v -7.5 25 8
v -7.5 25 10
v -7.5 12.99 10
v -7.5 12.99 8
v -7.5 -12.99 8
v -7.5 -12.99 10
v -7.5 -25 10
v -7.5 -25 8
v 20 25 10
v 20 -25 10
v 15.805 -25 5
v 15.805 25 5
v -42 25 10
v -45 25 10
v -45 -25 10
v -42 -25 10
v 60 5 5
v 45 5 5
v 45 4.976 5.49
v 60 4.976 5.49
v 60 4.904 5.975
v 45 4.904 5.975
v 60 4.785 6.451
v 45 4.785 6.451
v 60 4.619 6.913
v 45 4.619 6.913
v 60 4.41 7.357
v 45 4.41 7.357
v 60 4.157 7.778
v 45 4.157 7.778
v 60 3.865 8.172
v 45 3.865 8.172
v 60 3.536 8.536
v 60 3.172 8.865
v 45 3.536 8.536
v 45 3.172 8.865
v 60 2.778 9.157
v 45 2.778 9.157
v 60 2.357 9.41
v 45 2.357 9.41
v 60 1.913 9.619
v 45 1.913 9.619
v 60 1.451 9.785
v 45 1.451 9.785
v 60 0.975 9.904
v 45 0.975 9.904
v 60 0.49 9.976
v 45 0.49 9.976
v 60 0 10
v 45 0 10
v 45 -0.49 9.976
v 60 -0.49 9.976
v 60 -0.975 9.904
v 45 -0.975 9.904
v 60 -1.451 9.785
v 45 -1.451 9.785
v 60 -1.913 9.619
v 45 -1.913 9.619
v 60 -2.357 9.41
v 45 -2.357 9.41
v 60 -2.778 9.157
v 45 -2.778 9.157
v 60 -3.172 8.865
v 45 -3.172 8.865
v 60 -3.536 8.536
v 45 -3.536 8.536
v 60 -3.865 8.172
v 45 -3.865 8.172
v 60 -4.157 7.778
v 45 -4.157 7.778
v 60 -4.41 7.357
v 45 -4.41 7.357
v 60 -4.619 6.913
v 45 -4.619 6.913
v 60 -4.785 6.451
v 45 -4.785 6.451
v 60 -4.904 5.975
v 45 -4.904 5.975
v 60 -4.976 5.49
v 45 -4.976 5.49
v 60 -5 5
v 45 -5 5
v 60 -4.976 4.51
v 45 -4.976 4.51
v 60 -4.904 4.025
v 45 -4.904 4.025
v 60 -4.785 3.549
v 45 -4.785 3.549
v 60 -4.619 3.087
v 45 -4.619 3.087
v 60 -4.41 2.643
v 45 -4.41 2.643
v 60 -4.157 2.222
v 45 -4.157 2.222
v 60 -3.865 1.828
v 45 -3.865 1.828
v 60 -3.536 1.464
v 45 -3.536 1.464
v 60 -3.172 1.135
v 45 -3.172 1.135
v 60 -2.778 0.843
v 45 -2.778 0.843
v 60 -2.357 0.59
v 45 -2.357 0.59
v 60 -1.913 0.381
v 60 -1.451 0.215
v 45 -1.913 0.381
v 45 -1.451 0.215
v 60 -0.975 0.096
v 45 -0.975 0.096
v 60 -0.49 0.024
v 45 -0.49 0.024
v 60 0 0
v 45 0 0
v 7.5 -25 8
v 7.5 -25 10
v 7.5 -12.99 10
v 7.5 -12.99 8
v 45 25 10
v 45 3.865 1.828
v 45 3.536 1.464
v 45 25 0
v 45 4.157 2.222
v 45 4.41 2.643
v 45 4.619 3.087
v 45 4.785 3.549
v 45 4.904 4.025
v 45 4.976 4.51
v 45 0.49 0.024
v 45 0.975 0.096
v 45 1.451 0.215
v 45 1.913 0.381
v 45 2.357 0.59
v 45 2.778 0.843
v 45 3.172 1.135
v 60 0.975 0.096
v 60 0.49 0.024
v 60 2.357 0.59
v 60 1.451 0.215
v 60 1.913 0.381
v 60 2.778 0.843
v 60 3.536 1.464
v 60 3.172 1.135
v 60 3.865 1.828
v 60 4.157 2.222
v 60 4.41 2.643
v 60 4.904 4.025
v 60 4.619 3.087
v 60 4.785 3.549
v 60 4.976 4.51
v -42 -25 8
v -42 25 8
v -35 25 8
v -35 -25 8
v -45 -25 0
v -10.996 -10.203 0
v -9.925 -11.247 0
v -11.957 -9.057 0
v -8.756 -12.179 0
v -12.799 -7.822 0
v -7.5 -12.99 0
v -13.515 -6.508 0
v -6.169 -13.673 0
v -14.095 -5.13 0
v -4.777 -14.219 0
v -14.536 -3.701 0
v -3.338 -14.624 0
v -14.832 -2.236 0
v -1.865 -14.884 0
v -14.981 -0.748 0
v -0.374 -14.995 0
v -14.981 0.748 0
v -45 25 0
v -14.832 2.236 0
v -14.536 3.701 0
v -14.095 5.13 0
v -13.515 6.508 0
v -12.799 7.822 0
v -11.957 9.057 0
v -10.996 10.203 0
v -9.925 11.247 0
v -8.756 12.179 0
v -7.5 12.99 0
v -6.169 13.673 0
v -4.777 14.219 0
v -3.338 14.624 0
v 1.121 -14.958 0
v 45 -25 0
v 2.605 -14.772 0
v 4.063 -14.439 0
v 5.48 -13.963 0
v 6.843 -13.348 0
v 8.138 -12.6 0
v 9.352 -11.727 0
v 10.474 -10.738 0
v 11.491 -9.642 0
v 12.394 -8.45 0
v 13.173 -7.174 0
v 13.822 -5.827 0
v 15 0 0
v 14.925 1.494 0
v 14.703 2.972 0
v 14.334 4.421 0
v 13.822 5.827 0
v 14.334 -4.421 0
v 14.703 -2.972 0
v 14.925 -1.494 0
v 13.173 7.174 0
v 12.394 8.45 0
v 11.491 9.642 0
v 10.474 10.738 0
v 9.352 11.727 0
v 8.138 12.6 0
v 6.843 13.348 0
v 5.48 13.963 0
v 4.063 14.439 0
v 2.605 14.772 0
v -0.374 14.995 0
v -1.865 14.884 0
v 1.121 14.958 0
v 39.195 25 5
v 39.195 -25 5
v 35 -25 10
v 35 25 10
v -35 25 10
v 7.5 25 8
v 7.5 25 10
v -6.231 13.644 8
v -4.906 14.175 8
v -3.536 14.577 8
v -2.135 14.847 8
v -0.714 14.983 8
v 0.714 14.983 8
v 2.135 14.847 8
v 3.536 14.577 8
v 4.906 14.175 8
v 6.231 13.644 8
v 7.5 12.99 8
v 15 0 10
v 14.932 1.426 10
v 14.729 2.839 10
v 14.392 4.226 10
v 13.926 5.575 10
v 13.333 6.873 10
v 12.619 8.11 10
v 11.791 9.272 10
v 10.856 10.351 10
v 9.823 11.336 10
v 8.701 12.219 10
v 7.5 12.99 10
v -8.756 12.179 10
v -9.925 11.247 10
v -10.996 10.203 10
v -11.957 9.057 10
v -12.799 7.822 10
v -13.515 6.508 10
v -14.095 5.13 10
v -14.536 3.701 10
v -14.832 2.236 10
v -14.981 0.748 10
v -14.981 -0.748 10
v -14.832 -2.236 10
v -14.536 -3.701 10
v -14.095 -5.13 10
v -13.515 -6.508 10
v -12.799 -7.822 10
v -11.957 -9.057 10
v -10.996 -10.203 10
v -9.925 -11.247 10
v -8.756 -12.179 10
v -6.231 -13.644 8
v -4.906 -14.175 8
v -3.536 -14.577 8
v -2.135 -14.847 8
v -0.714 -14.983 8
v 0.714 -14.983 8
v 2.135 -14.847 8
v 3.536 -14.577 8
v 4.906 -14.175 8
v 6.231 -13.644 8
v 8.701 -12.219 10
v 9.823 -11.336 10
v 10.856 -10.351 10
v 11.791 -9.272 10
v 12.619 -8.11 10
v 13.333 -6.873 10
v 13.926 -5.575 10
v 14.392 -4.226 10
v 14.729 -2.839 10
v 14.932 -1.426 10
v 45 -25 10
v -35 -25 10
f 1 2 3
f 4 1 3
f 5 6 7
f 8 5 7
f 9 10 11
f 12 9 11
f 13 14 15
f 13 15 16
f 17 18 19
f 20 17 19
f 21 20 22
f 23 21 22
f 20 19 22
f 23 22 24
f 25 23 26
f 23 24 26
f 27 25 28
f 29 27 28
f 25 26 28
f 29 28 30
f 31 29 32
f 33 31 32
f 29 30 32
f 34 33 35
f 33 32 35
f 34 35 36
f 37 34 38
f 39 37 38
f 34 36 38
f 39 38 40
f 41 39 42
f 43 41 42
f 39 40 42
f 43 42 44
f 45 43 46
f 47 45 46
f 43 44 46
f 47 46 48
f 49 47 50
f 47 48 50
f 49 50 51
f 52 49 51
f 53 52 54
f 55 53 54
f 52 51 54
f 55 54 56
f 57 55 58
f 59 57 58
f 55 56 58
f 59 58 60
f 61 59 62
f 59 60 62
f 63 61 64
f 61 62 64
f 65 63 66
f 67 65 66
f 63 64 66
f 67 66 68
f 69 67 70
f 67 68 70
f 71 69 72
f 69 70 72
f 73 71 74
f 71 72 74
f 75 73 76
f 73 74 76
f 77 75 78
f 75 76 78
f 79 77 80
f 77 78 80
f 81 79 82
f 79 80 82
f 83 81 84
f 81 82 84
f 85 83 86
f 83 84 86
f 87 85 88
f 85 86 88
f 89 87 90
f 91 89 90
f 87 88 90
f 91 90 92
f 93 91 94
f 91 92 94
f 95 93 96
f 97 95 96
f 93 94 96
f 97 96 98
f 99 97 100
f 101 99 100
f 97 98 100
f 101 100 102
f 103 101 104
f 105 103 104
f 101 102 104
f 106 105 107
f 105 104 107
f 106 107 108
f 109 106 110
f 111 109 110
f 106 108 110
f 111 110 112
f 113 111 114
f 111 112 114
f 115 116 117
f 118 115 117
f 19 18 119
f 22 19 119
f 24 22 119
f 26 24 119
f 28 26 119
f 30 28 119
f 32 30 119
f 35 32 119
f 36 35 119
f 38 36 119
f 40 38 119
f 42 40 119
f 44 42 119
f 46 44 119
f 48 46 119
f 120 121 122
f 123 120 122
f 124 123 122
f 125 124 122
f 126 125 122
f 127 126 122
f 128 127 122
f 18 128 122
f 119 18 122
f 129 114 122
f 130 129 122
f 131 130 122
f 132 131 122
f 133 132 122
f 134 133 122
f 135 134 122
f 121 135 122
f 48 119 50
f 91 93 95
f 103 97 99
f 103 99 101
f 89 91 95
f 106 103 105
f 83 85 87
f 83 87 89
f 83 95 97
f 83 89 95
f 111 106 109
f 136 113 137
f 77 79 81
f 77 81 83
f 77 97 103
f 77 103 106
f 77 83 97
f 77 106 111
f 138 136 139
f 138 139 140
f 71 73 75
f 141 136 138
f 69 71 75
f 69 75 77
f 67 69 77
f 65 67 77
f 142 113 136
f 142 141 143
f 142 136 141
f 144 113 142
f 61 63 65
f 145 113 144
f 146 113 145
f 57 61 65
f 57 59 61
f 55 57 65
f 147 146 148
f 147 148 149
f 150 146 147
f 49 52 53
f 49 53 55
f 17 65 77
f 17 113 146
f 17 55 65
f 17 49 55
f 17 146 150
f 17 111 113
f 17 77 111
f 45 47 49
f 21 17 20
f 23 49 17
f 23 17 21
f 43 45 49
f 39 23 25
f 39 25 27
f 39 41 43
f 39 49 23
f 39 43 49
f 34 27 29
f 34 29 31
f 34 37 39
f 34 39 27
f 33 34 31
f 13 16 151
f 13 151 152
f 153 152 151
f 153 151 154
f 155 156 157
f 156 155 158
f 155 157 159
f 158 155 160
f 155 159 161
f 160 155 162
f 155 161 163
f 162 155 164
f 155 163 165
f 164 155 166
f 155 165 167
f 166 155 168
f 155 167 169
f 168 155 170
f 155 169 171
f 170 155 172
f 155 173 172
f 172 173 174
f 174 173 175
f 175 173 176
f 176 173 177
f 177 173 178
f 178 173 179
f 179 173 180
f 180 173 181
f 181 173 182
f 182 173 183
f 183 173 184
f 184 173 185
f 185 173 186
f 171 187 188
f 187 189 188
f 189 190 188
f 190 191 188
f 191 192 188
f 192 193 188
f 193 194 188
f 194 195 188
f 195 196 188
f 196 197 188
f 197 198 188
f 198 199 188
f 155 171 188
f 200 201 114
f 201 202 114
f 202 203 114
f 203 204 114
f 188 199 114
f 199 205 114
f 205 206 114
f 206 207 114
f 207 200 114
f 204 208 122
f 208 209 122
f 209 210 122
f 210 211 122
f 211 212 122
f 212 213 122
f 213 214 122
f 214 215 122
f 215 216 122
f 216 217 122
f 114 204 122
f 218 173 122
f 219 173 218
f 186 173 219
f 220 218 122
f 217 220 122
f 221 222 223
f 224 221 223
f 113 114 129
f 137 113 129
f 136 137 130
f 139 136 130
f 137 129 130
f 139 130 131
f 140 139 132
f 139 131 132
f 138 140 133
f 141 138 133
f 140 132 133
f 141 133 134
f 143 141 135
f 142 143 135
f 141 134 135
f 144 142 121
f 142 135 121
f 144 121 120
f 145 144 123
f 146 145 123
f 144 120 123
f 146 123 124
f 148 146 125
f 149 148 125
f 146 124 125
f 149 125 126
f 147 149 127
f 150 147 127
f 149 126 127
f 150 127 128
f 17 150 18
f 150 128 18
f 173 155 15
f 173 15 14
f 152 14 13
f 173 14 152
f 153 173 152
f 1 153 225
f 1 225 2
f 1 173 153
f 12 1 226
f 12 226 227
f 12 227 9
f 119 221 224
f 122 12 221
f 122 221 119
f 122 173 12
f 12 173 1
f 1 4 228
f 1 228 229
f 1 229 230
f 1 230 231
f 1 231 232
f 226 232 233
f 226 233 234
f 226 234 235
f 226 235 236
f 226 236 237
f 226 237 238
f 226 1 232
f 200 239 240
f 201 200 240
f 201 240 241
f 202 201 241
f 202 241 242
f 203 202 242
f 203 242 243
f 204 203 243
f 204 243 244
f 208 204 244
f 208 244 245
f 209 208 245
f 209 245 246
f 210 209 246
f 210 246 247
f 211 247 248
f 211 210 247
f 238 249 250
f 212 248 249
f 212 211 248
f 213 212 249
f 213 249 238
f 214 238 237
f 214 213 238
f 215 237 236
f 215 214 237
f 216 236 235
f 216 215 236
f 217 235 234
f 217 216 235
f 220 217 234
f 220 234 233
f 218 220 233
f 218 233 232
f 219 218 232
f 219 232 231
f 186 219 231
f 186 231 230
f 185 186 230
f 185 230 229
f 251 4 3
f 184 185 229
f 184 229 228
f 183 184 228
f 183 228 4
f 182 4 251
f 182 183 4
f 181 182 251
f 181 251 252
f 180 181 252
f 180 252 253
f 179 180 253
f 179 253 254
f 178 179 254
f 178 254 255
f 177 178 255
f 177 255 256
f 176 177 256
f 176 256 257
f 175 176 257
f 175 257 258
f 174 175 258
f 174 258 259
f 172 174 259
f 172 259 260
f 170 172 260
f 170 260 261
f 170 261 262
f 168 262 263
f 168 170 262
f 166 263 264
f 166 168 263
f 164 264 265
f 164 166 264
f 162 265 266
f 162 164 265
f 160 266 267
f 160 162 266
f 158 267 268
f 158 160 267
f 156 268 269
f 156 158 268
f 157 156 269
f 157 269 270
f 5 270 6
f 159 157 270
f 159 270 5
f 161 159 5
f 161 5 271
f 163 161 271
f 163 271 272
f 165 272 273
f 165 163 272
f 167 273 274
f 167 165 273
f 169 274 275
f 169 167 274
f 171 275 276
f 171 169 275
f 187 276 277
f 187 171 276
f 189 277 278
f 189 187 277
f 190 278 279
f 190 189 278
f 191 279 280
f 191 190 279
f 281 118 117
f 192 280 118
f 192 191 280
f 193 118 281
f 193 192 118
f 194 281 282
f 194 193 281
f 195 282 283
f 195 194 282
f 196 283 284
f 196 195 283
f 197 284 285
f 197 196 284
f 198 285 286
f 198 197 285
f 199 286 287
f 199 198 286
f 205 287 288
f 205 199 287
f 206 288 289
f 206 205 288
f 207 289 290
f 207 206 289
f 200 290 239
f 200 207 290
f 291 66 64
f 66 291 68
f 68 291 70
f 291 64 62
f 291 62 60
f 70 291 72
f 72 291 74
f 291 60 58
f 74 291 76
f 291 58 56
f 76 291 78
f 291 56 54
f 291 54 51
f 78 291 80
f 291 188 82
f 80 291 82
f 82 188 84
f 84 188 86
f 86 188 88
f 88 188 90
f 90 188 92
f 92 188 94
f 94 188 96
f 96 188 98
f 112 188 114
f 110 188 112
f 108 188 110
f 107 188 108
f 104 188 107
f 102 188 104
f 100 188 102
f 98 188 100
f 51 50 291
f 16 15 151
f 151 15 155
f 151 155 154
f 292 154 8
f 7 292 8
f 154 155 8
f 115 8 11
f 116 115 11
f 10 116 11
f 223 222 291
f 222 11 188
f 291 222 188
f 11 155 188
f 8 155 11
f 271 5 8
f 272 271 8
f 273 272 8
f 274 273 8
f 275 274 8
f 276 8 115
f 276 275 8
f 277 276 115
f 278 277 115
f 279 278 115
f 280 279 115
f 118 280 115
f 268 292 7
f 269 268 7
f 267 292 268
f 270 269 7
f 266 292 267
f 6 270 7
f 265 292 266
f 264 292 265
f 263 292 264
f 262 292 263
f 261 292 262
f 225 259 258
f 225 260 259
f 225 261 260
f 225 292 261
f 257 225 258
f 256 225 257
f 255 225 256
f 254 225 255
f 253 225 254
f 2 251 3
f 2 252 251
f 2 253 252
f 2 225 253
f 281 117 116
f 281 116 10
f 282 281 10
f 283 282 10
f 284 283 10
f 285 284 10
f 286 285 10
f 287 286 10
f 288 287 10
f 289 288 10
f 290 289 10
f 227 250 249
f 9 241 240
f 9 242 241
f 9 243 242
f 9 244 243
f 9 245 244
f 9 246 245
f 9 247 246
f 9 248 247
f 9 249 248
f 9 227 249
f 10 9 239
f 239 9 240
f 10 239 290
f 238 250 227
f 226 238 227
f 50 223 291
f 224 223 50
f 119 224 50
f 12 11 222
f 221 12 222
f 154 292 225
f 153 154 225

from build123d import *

# Parameters (mm, degrees)
F0_W     = 89.999996
F0_H     = 50
F0_R     = 15
F1_DEPTH = 10
F2_W     = 7
F2_H     = 50
F3_DEPTH = 2
F5_DEPTH = 50.001
F7_DEPTH = 15


with BuildPart() as f1:
    # F0 (on Top) → F1 (new body)
    with BuildSketch(Plane.XY):
        Rectangle(F0_W, F0_H)
        Circle(F0_R, mode=Mode.SUBTRACT)
    extrude(amount=F1_DEPTH)

    # F2 (on face) → F3 (cut)
    with BuildSketch(Plane.XY.offset(10)):
        with Locations((-38.499998, 0)):
            Rectangle(F2_W, F2_H)
        with BuildLine():
            Line((-7.5, -12.990381), (-7.5, -25))
            Line((-7.5, -25), (7.5, -25))
            Line((7.5, -25), (7.5, -12.990381))
            ThreePointArc((7.5, -12.990381), (0, -15), (-7.5, -12.990381))
        make_face()
        with BuildLine():
            Line((7.5, 25), (-7.5, 25))
            Line((-7.5, 25), (-7.5, 12.990381))
            ThreePointArc((-7.5, 12.990381), (0, 15), (7.5, 12.990381))
            Line((7.5, 12.990381), (7.5, 25))
        make_face()
    extrude(amount=-F3_DEPTH, mode=Mode.SUBTRACT)

    # F4 (on face) → F5 (cut, through all)
    with BuildSketch(Plane.XZ.offset(25)):
        Polygon((35, 10), (20, 10), (15.804502, 5), (39.195498, 5), align=None)
    extrude(amount=-F5_DEPTH, mode=Mode.SUBTRACT)

    # F6 (on face) → F7 (join)
    with BuildSketch(Plane.YZ.offset(44.999998)):
        with BuildLine():
            ThreePointArc((0, 0), (3.535534, 1.464466), (5, 5))
            ThreePointArc((5, 5), (3.535534, 8.535534), (0, 10))
            ThreePointArc((0, 10), (-5, 5), (0, 0))
        make_face()
    extrude(amount=F7_DEPTH)


solid = f1.part
